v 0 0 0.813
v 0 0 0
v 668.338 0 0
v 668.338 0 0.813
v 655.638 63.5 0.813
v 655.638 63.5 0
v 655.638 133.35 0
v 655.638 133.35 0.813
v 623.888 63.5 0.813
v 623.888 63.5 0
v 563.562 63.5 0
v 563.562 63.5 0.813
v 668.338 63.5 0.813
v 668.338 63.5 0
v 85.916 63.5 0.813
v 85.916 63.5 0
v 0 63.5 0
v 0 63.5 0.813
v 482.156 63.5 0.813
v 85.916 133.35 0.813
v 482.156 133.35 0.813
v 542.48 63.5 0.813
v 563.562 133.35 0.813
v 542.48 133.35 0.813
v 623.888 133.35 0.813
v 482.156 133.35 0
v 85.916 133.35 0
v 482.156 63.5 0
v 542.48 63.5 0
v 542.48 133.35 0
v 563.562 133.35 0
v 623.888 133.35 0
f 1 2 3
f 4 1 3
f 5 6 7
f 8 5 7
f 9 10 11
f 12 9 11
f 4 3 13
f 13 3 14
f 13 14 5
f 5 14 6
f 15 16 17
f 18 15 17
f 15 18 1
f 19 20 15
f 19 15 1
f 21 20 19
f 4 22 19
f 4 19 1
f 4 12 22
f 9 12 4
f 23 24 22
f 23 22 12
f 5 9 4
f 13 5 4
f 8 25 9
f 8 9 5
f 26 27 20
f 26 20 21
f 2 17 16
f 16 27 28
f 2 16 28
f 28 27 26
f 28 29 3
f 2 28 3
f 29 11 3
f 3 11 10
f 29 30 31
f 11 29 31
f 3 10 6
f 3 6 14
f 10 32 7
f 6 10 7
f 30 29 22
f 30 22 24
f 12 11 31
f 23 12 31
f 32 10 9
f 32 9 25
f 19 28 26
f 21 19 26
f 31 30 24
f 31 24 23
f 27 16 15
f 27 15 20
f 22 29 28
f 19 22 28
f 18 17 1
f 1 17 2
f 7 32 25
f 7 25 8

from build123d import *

# Parameters (mm, degrees)
F0_W     = 396.24
F0_H     = 69.85
F0_W_2   = 21.082
F0_W_3   = 31.75
F1_DEPTH = 0.8128


with BuildPart() as f1:
    # F0 (on Top) → F1 (new body)
    with BuildSketch(Plane.XY):
        Polygon((0, 63.5), (0, 0), (668.3375, 0), (668.3375, 63.5), (655.6375, 63.5), (623.8875, 63.5), (563.5625, 63.5), (542.4805, 63.5), (482.1555, 63.5), (85.9155, 63.5), align=None)
        with Locations((284.0355, 98.425)):
            Rectangle(F0_W, F0_H)
        with Locations((553.0215, 98.425)):
            Rectangle(F0_W_2, F0_H)
        with Locations((639.7625, 98.425)):
            Rectangle(F0_W_3, F0_H)
    extrude(amount=F1_DEPTH)


solid = f1.part
